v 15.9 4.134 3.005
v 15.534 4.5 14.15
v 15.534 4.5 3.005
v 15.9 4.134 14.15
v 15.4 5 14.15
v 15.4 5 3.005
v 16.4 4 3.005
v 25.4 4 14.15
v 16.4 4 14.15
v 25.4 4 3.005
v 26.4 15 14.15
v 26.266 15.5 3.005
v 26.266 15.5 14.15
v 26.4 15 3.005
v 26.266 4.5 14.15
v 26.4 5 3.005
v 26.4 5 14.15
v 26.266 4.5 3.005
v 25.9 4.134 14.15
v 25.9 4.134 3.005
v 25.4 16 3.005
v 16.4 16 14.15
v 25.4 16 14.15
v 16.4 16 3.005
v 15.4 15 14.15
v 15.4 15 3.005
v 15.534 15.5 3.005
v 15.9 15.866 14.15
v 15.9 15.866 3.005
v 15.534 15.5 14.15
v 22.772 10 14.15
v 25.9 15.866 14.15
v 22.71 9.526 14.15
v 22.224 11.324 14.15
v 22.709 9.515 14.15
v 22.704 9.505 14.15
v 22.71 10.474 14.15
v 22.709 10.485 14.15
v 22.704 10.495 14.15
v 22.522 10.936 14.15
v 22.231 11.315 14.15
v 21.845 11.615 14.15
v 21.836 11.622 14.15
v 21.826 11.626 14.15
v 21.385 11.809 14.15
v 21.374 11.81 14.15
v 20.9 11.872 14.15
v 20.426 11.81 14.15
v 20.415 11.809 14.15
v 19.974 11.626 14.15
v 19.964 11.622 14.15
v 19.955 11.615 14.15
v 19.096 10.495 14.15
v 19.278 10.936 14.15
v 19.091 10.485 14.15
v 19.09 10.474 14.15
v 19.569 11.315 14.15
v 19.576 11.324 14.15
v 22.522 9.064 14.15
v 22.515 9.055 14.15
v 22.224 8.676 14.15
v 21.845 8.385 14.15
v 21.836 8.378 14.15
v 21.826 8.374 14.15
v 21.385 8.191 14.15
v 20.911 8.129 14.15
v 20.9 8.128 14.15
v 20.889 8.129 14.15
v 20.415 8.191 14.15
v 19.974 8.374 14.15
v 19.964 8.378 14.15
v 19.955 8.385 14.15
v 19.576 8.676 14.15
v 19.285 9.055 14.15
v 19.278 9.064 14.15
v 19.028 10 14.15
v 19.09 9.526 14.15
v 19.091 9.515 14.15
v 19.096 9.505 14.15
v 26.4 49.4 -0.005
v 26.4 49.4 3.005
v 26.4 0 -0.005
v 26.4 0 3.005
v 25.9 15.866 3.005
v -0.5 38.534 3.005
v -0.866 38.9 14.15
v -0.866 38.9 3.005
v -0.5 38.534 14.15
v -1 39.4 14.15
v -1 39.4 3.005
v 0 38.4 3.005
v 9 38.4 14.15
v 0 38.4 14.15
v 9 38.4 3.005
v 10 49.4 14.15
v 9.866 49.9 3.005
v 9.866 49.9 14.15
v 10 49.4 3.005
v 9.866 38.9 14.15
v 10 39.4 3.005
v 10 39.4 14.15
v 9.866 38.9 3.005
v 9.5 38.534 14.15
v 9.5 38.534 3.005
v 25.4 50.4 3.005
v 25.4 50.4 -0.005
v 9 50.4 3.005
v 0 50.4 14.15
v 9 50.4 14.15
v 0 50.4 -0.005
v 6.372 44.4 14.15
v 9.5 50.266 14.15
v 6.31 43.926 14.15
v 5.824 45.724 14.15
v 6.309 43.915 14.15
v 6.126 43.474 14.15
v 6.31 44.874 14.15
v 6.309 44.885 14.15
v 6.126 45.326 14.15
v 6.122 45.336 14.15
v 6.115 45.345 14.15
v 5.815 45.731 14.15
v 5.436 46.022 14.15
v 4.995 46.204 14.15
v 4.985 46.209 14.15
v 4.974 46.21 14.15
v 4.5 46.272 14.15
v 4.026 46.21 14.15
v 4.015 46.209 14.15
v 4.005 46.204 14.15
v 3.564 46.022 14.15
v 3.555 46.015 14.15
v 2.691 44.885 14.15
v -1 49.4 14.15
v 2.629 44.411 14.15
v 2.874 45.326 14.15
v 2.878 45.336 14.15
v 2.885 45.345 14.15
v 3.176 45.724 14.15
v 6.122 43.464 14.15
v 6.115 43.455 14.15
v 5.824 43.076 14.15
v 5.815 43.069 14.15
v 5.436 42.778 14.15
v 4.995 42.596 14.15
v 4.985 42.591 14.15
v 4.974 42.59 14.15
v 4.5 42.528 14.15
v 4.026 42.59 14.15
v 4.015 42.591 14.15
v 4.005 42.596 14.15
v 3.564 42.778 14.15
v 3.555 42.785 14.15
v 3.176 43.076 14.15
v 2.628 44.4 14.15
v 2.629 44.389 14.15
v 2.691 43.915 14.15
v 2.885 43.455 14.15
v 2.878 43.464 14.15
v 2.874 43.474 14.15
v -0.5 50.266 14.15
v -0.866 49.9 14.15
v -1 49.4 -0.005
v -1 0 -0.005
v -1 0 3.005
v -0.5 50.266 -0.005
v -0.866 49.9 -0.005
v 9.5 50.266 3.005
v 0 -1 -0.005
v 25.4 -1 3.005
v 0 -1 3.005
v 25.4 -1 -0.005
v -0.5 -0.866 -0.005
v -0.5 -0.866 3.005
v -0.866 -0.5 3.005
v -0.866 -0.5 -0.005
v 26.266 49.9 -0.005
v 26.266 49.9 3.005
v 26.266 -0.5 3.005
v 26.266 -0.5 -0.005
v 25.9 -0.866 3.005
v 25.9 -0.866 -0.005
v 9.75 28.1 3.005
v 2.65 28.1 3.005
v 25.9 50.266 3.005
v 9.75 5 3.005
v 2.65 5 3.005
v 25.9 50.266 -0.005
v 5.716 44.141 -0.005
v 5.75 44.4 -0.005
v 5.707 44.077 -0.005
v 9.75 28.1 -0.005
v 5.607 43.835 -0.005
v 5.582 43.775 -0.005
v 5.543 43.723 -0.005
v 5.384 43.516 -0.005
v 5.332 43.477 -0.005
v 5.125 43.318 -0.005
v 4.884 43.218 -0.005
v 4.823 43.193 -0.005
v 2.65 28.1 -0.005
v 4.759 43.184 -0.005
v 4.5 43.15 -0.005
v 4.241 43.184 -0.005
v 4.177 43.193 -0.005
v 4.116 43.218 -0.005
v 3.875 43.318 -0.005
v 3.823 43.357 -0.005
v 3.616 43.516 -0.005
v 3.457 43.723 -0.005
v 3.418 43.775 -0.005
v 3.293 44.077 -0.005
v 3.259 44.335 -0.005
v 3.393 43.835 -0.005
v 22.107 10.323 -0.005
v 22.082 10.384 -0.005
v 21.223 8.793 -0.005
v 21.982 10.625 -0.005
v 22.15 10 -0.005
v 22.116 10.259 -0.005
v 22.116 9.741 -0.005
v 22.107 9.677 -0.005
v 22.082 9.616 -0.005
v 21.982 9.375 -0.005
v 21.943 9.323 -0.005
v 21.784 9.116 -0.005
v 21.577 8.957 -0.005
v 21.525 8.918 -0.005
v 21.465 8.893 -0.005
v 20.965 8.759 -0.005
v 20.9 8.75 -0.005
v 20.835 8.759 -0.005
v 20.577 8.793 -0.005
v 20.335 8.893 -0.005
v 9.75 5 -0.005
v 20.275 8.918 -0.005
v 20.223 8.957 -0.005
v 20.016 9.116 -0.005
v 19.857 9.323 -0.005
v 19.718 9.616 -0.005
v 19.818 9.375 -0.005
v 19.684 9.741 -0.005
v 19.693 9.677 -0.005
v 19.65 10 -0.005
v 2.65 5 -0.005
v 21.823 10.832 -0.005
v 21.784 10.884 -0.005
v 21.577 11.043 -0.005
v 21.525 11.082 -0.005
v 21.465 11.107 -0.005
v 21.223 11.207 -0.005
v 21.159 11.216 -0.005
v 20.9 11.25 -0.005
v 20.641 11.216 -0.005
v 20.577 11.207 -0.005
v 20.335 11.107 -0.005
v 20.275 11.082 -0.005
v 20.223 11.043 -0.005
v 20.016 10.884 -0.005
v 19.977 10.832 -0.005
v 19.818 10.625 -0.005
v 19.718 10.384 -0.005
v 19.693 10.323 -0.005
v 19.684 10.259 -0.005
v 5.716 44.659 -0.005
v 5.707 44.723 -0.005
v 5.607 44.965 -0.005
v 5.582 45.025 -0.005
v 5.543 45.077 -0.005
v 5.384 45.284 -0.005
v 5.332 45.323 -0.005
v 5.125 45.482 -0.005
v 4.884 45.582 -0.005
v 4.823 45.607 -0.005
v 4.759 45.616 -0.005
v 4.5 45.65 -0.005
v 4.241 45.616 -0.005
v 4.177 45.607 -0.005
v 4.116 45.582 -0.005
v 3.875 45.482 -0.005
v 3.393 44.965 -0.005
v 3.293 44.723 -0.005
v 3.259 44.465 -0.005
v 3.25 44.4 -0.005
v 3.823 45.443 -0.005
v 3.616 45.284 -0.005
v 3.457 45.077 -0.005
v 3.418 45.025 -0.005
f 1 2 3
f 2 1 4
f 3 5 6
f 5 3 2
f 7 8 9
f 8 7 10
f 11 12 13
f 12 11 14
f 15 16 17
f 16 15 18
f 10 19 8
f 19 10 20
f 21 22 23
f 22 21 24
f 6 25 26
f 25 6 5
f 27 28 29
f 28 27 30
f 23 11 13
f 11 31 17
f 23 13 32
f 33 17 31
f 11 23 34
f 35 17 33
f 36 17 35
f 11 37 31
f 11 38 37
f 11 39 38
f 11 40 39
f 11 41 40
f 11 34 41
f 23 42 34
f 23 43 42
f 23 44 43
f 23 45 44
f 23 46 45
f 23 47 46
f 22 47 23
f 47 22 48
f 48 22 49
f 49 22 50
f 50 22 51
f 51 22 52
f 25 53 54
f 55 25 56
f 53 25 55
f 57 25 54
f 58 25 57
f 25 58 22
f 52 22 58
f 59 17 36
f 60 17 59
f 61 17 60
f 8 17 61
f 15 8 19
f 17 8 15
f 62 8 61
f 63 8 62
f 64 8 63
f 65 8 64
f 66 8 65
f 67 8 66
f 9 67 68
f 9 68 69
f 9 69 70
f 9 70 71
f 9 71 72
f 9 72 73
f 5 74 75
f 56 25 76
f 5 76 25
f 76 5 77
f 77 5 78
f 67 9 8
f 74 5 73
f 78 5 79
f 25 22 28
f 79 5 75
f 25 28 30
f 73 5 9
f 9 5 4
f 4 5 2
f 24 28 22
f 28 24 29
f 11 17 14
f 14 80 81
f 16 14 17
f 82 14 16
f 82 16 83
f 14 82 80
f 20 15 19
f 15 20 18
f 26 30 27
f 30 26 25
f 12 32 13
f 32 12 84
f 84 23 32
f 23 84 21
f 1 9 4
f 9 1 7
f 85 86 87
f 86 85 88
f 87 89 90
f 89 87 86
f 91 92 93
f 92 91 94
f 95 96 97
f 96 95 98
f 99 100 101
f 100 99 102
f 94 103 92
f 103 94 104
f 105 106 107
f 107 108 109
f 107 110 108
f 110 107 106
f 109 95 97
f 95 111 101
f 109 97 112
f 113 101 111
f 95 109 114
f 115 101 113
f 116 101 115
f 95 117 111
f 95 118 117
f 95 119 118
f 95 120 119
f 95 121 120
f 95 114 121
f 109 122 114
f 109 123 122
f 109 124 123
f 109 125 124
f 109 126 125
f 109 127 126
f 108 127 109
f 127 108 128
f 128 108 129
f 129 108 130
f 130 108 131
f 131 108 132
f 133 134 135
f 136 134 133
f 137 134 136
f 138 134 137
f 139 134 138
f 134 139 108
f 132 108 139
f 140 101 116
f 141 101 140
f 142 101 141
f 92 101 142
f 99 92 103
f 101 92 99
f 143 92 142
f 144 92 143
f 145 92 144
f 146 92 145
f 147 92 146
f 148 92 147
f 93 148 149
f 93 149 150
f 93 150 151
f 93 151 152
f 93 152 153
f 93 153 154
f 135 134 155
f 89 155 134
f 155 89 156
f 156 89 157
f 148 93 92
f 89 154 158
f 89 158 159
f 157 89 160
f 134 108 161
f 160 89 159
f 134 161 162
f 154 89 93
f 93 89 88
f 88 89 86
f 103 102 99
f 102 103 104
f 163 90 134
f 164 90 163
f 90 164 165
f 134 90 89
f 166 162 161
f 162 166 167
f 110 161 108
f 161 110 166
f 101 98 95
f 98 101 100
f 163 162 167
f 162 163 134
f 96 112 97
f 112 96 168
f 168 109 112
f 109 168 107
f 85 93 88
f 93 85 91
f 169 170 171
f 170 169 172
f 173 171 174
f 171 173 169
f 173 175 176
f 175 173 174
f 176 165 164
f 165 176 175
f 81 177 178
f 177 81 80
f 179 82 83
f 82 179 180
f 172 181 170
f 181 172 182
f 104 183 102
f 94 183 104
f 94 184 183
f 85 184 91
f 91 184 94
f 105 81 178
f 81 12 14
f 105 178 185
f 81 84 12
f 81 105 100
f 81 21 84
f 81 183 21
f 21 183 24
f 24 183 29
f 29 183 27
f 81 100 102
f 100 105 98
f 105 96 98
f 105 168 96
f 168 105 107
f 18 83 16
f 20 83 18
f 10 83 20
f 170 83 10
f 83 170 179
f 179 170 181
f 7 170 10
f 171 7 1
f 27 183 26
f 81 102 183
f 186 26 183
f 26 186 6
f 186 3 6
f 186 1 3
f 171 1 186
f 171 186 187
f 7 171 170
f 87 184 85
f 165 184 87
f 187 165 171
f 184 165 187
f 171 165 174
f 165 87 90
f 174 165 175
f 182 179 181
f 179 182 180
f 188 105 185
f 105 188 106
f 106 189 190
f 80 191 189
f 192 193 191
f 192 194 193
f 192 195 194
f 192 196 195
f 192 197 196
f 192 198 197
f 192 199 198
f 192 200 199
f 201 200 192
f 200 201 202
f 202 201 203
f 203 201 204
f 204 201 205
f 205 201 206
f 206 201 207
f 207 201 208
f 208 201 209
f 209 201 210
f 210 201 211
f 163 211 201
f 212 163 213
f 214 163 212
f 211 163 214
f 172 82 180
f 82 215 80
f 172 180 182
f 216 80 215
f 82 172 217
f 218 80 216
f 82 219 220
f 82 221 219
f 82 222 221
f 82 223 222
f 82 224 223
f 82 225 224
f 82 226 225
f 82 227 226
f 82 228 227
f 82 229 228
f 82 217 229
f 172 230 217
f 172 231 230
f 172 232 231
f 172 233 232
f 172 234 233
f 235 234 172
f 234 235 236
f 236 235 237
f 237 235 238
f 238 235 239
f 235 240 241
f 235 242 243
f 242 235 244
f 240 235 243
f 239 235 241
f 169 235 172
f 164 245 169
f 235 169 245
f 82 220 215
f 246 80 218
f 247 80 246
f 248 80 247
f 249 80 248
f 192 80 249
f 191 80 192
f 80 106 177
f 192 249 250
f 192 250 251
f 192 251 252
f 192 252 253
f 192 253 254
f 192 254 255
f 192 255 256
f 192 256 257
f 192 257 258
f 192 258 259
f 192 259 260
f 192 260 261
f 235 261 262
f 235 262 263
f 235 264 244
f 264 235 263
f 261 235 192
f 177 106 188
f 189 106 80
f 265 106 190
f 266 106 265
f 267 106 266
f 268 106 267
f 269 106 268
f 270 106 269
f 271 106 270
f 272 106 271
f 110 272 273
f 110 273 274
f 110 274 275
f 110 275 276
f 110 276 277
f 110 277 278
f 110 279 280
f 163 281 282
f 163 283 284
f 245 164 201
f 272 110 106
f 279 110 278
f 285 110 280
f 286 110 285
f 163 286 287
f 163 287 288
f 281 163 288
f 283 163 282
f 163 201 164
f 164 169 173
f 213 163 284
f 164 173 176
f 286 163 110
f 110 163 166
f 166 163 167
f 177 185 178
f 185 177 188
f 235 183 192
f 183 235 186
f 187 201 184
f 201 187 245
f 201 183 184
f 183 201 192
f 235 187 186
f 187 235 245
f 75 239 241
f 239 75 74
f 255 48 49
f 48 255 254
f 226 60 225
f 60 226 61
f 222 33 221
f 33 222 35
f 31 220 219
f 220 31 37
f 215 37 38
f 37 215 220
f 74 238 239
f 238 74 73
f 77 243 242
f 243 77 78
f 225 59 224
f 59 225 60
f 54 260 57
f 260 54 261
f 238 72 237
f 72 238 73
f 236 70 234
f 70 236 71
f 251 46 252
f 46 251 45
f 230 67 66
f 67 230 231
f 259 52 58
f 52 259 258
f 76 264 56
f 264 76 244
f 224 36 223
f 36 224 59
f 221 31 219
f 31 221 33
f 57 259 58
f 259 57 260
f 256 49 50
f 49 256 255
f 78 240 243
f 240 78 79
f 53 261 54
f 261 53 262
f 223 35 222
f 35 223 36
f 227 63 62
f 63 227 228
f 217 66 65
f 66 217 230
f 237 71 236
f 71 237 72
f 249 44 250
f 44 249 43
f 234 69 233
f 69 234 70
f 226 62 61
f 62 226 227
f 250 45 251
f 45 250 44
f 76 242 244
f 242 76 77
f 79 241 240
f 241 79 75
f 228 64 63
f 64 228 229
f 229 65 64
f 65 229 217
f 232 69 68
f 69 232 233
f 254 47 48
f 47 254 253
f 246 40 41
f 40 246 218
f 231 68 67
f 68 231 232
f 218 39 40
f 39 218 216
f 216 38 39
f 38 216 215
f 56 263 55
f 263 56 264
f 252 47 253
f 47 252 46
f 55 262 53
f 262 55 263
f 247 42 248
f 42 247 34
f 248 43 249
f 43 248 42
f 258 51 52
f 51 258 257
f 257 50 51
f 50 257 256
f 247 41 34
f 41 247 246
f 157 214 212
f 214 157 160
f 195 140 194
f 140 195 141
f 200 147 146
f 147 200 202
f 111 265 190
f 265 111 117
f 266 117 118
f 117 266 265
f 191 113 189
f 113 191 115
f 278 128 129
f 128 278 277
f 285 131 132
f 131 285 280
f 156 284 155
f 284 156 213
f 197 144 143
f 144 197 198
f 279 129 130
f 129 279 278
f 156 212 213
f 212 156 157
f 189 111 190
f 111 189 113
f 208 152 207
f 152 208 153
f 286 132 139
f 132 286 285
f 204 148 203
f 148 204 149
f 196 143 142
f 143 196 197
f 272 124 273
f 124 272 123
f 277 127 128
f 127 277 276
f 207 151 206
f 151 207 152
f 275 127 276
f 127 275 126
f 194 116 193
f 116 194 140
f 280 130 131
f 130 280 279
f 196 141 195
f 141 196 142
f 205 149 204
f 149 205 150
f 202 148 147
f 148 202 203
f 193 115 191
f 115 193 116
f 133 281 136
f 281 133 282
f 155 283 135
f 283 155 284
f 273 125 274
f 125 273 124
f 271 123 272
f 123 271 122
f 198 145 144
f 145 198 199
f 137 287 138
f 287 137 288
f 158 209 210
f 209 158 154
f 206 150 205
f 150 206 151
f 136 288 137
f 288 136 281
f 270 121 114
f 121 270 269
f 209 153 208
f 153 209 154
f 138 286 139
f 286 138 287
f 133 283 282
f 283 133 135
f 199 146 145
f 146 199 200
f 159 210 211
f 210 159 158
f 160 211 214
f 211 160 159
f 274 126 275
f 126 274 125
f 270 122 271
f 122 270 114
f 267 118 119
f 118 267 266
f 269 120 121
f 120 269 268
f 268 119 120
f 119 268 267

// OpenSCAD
// file: tools/MCAD/metric_fasteners_tab.scad
//
// Symbols
//
M1x0_25 = 0;
M1 = M1x0_25;
M1_2x0_25 = 1;
M1_2 = M1_2x0_25;
M1_4x0_3 = 2;
M1_4 = M1_4x0_3;
M1_6x0_35 = 3;
M1_6 = M1_6x0_35;
M2x0_4 = 4;
M2 = M2x0_4;
M2_5x0_45 = 5;
M2_5 = M2_5x0_45;
M3x0_5 = 6;
M3 = M3x0_5;
M3_5x0_6 = 7;
M3_5 = M3_5x0_6;
M4x0_7 = 8;
M4 = M4x0_7;
M5x0_8 = 9;
M5 = M5x0_8;
M6x1 = 10;
M6 = M6x1;
M7x1 = 11;
M7 = M7x1;
M8x1 = 12;
M8x1_25 = 13;
M8 = M8x1_25;
M10x1 = 14;
M10x1_25 = 15;
M10x1_5 = 16;
M10 = M10x1_5;
M12x1_25 = 17;
M12x1_5 = 18;
M12x1_75 = 19;
M12 = M12x1_75;
M14x1_5 = 20;
M14x2 = 21;
M14 = M14x2;
M16x1_5 = 22;
M16x2 = 23;
M16 = M16x2;
M18x1_5 = 24;
M18x2 = 25;
M18x2_5 = 26;
M18 = M18x2_5;
M20x1_5 = 27;
M20x2 = 28;
M20x2_5 = 29;
M20 = M20x2_5;
M22x1_5 = 30;
M22x2 = 31;
M22x2_5 = 32;
M22 = M22x2_5;
M24x2 = 33;
M24x3 = 34;
M24 = M24x3;
M27x2 = 35;
M27x3 = 36;
M27 = M27x3;
M30x2 = 37;
M30x3_5 = 38;
M30 = M30x3_5;
M33x2 = 39;
M33x3_5 = 40;
M33 = M33x3_5;
M36x3 = 41;
M36x4 = 42;
M36 = M36x4;
M39x3 = 43;
M39x4 = 44;
M39 = M39x4;
M42x3 = 45;
M42x4_5 = 46;
M42 = M42x4_5;
M45x3 = 47;
M45x4_5 = 48;
M45 = M45x4_5;
M48x3 = 49;
M48x5 = 50;
M48 = M48x5;
M52x4 = 51;
M52x5 = 52;
M52 = M52x5;
M56x4 = 53;
M56x5_5 = 54;
M56 = M56x5_5;
M60x4 = 55;
M60x5_5 = 56;
M60 = M60x5_5;
M64x4 = 57;
M64x6 = 58;
M64 = M64x6;

//
// Threads
//
METRIC_THREADS = [
	/* d, p */
	[1, 0.25],
	[1.2, 0.25],
	[1.4, 0.3],
	[1.6, 0.35],
	[2, 0.4],
	[2.5, 0.45],
	[3, 0.5],
	[3.5, 0.6],
	[4, 0.7],
	[5, 0.8],
	[6, 1],
	[7, 1],
	[8, 1],
	[8, 1.25],
	[10, 1],
	[10, 1.25],
	[10, 1.5],
	[12, 1.25],
	[12, 1.5],
	[12, 1.75],
	[14, 1.5],
	[14, 2],
	[16, 1.5],
	[16, 2],
	[18, 1.5],
	[18, 2],
	[18, 2.5],
	[20, 1.5],
	[20, 2],
	[20, 2.5],
	[22, 1.5],
	[22, 2],
	[22, 2.5],
	[24, 2],
	[24, 3],
	[27, 2],
	[27, 3],
	[30, 2],
	[30, 3.5],
	[33, 2],
	[33, 3.5],
	[36, 3],
	[36, 4],
	[39, 3],
	[39, 4],
	[42, 3],
	[42, 4.5],
	[45, 3],
	[45, 4.5],
	[48, 3],
	[48, 5],
	[52, 4],
	[52, 5],
	[56, 4],
	[56, 5.5],
	[60, 4],
	[60, 5.5],
	[64, 4],
	[64, 6],
];

//
// Hexagonal heads and nuts
//
METRIC_HEXAGONAL_HEADS_AND_NUTS = [
	/* d, m, s */
	[1, 0.8, 2.5],
	[1.2, 1.0, 3.0],
	[1.4, 1.2, 3.0],
	[1.6, 1.3, 3.2],
	[2, 1.6, 4.0],
	[2.5, 2.0, 5.0],
	[3, 2.4, 5.5],
	[3.5, 2.8, 6.0],
	[4, 3.2, 7.0],
	[5, 4.7, 8.0],
	[6, 5.2, 10.0],
	[7, 5.5, 11.0],
	[8, 6.8, 13.0],
	[8, 6.8, 13.0],
	[10, 8.4, 16.0],
	[10, 8.4, 16.0],
	[10, 8.4, 16.0],
	[12, 10.8, 18.0],
	[12, 10.8, 18.0],
	[12, 10.8, 18.0],
	[14, 12.8, 21.0],
	[14, 12.8, 21.0],
	[16, 14.8, 24.0],
	[16, 14.8, 24.0],
	[18, 15.8, 27.0],
	[18, 15.8, 27.0],
	[18, 15.8, 27.0],
	[20, 18.0, 30.0],
	[20, 18.0, 30.0],
	[20, 18.0, 30.0],
	[22, 19.4, 34.0],
	[22, 19.4, 34.0],
	[22, 19.4, 34.0],
	[24, 21.5, 36.0],
	[24, 21.5, 36.0],
	[27, 23.8, 41.0],
	[27, 23.8, 41.0],
	[30, 25.6, 46.0],
	[30, 25.6, 46.0],
	[33, 28.7, 50.0],
	[33, 28.7, 50.0],
	[36, 31.0, 55.0],
	[36, 31.0, 55.0],
	[39, 33.4, 60.0],
	[39, 33.4, 60.0],
	[42, 34.0, 65.0],
	[42, 34.0, 65.0],
	[45, 36.0, 70.0],
	[45, 36.0, 70.0],
	[48, 38.0, 75.0],
	[48, 38.0, 75.0],
	[52, 42.0, 80.0],
	[52, 42.0, 80.0],
	[56, 45.0, 85.0],
	[56, 45.0, 85.0],
	[60, 48.0, 90.0],
	[60, 48.0, 90.0],
	[64, 51.0, 95.0],
	[64, 51.0, 95.0],
];

//
// Washers
//
METRIC_WASHERS = [
	/* wd1, wd2, wh */
	[1.1, 3, 0.3],
	[1.3, 3.5, 0.3],
	[1.5, 4, 0.3],
	[1.7, 4, 0.3],
	[2.2, 5, 0.3],
	[2.7, 6, 0.5],
	[3.2, 7, 0.5],
	[3.7, 8, 0.5],
	[4.3, 9, 0.8],
	[5.3, 10, 1],
	[6.4, 12, 1.6],
	[7.4, 14, 1.6],
	[8.4, 16, 1.6],
	[8.4, 16, 1.6],
	[10.5, 20, 2],
	[10.5, 20, 2],
	[10.5, 20, 2],
	[13, 24, 2.5],
	[13, 24, 2.5],
	[13, 24, 2.5],
	[15, 28, 2.5],
	[15, 28, 2.5],
	[17, 30, 3],
	[17, 30, 3],
	[19, 34, 3],
	[19, 34, 3],
	[19, 34, 3],
	[21, 37, 3],
	[21, 37, 3],
	[21, 37, 3],
	[23, 39, 3],
	[23, 39, 3],
	[23, 39, 3],
	[25, 44, 4],
	[25, 44, 4],
	[28, 50, 4],
	[28, 50, 4],
	[31, 56, 4],
	[31, 56, 4],
	[34, 60, 5],
	[34, 60, 5],
	[37, 66, 5],
	[37, 66, 5],
	[42, 72, 6],
	[42, 72, 6],
	[45, 78, 8],
	[45, 78, 8],
	[48, 85, 8],
	[48, 85, 8],
	[52, 92, 8],
	[52, 92, 8],
	[56, 98, 8],
	[56, 98, 8],
	[62, 105, 10],
	[62, 105, 10],
	[66, 110, 10],
	[66, 110, 10],
	[70, 115, 10],
	[70, 115, 10],
];
// file: tools/MCAD/metric_fasteners.scad
// -*- mode: scad; c-basic-offset: 4; c-file-style: "k&r"; indent-tabs-mode: nil -*-

/** \file fasteners.scad Metric fasteners: bolts, nuts, washers etc.
 */

include <metric_fasteners_tab.scad>

/**
 * The thickness of a hex nut.
 *
 * @param size  Index in the tables. Use M* variables.
 */
function hex_nut_thickness(size) = METRIC_HEXAGONAL_HEADS_AND_NUTS[size][1];

/**
 * Basic metric bolt with hexagonal head.
 *
 * @param size Index in the tables. Use M* variables.
 *
 * @param length Length of the thread.
 */

module hex_bolt(size, length)
{
    d = METRIC_THREADS[size][0];
    m = METRIC_HEXAGONAL_HEADS_AND_NUTS[size][1];
    s = METRIC_HEXAGONAL_HEADS_AND_NUTS[size][2];
    a = 0.1 * m;
    b = s / 1.73205;
    bolt_length = (length == undef) ? m : length;
    render()
        union()
    {
        translate([0, 0, -a])
            cylinder(r = d/2, h=bolt_length + a, $fn=24);
        translate([0, 0, -m])
            cylinder(r = b, h = m, $fn = 6);
    }
}

/**
 * Basic metric hexagonal nut *without* a threaded hole in it.
 *
 * @param size Index in the tables. Use M* variables
 */

module hex_nut (size)
{
    d = METRIC_THREADS[size][0];
    m = METRIC_HEXAGONAL_HEADS_AND_NUTS[size][1];
    s = METRIC_HEXAGONAL_HEADS_AND_NUTS[size][2];
    a = 0.1 * m;
    b = s / 1.73205;

    render ()
        cylinder (r = b, h = m, $fn = 6);
}

/**
 * Basic metric hexagonal nut *with* a hole in it. Avoid using this
 * module to carve holes for nuts and bolts because you may not get a
 * manifold mesh.
 *
 * @param size Index in the tables. Use M* variables
 */

module hex_nut_hole (size)
{
    d = METRIC_THREADS[size][0];
    m = METRIC_HEXAGONAL_HEADS_AND_NUTS[size][1];
    s = METRIC_HEXAGONAL_HEADS_AND_NUTS[size][2];
    a = 0.1 * m;
    b = s / 1.73205;

    render ()
        difference ()
    {
        cylinder (r = b, h = m, $fn = 6);
        translate ([0, 0, -0.05])
            cylinder (d = d, h = m + 0.1, $fn = 26);
    }
}
// main file
use <tools/MCAD/metric_fasteners.scad>

width = 25.4;	// actual is 1"
height = 44.4;	// actual is 1.550"
depth = 3;
wall_thickness = 5;
pcb_z_offset = 11;
slot_dist_from_edge = 5;
pcb_pad_width = 9;
pcb_pad_height = 10;
clip_width = 23.1;
clip_height = 7.1;

term_mnt_5mm_clip(width, height, depth, wall_thickness, pcb_z_offset, slot_dist_from_edge, 
	pcb_pad_width, pcb_pad_height, clip_width, clip_height);

module term_mnt_5mm_clip(w, h, d, wt, pcbz, sdfe, ppw, pph, cw, ch) {
difference() {
  union() {
	// pcb mount pads
    minkowski() {
      union() {
    translate([w - ppw, 5, d]) cube([ppw, pph, pcbz + 0.1]);
    translate([0, h - pph + 5, d]) cube([ppw, pph, pcbz + 0.1]);
    }
    translate([0, 0, 0]) cylinder(r = 1, h = 0.1, center = true, $fn = 12);
  }
	// base support
    minkowski() { 
      union() {
        translate([0, 0, 0]) cube([w, h + 5, d]);
    }
    translate([0, 0, 0]) cylinder(r = 1, h = 0.01, center = true, $fn = 12);
  }
}
    // extrusion clip mount hole
    translate([w / 2 - 20.1 / 2, sdfe, -0.01]) cube([ch, cw, d + 3]);
    // pcb mount hls
    translate([w - (ppw / 2), pph / 2 + 5, 0]) cylinder(r1 = 0.5, r2 = 2, h = d * 4 + pcbz * 2 + 0.1, center = true, $fn = 24);
    translate([ppw / 2, h - (pph / 2) + 5, 0]) cylinder(r1 = 0.5, r2 = 2, h = d * 4+ pcbz * 2 + 0.1, center = true, $fn = 24);
}
}
